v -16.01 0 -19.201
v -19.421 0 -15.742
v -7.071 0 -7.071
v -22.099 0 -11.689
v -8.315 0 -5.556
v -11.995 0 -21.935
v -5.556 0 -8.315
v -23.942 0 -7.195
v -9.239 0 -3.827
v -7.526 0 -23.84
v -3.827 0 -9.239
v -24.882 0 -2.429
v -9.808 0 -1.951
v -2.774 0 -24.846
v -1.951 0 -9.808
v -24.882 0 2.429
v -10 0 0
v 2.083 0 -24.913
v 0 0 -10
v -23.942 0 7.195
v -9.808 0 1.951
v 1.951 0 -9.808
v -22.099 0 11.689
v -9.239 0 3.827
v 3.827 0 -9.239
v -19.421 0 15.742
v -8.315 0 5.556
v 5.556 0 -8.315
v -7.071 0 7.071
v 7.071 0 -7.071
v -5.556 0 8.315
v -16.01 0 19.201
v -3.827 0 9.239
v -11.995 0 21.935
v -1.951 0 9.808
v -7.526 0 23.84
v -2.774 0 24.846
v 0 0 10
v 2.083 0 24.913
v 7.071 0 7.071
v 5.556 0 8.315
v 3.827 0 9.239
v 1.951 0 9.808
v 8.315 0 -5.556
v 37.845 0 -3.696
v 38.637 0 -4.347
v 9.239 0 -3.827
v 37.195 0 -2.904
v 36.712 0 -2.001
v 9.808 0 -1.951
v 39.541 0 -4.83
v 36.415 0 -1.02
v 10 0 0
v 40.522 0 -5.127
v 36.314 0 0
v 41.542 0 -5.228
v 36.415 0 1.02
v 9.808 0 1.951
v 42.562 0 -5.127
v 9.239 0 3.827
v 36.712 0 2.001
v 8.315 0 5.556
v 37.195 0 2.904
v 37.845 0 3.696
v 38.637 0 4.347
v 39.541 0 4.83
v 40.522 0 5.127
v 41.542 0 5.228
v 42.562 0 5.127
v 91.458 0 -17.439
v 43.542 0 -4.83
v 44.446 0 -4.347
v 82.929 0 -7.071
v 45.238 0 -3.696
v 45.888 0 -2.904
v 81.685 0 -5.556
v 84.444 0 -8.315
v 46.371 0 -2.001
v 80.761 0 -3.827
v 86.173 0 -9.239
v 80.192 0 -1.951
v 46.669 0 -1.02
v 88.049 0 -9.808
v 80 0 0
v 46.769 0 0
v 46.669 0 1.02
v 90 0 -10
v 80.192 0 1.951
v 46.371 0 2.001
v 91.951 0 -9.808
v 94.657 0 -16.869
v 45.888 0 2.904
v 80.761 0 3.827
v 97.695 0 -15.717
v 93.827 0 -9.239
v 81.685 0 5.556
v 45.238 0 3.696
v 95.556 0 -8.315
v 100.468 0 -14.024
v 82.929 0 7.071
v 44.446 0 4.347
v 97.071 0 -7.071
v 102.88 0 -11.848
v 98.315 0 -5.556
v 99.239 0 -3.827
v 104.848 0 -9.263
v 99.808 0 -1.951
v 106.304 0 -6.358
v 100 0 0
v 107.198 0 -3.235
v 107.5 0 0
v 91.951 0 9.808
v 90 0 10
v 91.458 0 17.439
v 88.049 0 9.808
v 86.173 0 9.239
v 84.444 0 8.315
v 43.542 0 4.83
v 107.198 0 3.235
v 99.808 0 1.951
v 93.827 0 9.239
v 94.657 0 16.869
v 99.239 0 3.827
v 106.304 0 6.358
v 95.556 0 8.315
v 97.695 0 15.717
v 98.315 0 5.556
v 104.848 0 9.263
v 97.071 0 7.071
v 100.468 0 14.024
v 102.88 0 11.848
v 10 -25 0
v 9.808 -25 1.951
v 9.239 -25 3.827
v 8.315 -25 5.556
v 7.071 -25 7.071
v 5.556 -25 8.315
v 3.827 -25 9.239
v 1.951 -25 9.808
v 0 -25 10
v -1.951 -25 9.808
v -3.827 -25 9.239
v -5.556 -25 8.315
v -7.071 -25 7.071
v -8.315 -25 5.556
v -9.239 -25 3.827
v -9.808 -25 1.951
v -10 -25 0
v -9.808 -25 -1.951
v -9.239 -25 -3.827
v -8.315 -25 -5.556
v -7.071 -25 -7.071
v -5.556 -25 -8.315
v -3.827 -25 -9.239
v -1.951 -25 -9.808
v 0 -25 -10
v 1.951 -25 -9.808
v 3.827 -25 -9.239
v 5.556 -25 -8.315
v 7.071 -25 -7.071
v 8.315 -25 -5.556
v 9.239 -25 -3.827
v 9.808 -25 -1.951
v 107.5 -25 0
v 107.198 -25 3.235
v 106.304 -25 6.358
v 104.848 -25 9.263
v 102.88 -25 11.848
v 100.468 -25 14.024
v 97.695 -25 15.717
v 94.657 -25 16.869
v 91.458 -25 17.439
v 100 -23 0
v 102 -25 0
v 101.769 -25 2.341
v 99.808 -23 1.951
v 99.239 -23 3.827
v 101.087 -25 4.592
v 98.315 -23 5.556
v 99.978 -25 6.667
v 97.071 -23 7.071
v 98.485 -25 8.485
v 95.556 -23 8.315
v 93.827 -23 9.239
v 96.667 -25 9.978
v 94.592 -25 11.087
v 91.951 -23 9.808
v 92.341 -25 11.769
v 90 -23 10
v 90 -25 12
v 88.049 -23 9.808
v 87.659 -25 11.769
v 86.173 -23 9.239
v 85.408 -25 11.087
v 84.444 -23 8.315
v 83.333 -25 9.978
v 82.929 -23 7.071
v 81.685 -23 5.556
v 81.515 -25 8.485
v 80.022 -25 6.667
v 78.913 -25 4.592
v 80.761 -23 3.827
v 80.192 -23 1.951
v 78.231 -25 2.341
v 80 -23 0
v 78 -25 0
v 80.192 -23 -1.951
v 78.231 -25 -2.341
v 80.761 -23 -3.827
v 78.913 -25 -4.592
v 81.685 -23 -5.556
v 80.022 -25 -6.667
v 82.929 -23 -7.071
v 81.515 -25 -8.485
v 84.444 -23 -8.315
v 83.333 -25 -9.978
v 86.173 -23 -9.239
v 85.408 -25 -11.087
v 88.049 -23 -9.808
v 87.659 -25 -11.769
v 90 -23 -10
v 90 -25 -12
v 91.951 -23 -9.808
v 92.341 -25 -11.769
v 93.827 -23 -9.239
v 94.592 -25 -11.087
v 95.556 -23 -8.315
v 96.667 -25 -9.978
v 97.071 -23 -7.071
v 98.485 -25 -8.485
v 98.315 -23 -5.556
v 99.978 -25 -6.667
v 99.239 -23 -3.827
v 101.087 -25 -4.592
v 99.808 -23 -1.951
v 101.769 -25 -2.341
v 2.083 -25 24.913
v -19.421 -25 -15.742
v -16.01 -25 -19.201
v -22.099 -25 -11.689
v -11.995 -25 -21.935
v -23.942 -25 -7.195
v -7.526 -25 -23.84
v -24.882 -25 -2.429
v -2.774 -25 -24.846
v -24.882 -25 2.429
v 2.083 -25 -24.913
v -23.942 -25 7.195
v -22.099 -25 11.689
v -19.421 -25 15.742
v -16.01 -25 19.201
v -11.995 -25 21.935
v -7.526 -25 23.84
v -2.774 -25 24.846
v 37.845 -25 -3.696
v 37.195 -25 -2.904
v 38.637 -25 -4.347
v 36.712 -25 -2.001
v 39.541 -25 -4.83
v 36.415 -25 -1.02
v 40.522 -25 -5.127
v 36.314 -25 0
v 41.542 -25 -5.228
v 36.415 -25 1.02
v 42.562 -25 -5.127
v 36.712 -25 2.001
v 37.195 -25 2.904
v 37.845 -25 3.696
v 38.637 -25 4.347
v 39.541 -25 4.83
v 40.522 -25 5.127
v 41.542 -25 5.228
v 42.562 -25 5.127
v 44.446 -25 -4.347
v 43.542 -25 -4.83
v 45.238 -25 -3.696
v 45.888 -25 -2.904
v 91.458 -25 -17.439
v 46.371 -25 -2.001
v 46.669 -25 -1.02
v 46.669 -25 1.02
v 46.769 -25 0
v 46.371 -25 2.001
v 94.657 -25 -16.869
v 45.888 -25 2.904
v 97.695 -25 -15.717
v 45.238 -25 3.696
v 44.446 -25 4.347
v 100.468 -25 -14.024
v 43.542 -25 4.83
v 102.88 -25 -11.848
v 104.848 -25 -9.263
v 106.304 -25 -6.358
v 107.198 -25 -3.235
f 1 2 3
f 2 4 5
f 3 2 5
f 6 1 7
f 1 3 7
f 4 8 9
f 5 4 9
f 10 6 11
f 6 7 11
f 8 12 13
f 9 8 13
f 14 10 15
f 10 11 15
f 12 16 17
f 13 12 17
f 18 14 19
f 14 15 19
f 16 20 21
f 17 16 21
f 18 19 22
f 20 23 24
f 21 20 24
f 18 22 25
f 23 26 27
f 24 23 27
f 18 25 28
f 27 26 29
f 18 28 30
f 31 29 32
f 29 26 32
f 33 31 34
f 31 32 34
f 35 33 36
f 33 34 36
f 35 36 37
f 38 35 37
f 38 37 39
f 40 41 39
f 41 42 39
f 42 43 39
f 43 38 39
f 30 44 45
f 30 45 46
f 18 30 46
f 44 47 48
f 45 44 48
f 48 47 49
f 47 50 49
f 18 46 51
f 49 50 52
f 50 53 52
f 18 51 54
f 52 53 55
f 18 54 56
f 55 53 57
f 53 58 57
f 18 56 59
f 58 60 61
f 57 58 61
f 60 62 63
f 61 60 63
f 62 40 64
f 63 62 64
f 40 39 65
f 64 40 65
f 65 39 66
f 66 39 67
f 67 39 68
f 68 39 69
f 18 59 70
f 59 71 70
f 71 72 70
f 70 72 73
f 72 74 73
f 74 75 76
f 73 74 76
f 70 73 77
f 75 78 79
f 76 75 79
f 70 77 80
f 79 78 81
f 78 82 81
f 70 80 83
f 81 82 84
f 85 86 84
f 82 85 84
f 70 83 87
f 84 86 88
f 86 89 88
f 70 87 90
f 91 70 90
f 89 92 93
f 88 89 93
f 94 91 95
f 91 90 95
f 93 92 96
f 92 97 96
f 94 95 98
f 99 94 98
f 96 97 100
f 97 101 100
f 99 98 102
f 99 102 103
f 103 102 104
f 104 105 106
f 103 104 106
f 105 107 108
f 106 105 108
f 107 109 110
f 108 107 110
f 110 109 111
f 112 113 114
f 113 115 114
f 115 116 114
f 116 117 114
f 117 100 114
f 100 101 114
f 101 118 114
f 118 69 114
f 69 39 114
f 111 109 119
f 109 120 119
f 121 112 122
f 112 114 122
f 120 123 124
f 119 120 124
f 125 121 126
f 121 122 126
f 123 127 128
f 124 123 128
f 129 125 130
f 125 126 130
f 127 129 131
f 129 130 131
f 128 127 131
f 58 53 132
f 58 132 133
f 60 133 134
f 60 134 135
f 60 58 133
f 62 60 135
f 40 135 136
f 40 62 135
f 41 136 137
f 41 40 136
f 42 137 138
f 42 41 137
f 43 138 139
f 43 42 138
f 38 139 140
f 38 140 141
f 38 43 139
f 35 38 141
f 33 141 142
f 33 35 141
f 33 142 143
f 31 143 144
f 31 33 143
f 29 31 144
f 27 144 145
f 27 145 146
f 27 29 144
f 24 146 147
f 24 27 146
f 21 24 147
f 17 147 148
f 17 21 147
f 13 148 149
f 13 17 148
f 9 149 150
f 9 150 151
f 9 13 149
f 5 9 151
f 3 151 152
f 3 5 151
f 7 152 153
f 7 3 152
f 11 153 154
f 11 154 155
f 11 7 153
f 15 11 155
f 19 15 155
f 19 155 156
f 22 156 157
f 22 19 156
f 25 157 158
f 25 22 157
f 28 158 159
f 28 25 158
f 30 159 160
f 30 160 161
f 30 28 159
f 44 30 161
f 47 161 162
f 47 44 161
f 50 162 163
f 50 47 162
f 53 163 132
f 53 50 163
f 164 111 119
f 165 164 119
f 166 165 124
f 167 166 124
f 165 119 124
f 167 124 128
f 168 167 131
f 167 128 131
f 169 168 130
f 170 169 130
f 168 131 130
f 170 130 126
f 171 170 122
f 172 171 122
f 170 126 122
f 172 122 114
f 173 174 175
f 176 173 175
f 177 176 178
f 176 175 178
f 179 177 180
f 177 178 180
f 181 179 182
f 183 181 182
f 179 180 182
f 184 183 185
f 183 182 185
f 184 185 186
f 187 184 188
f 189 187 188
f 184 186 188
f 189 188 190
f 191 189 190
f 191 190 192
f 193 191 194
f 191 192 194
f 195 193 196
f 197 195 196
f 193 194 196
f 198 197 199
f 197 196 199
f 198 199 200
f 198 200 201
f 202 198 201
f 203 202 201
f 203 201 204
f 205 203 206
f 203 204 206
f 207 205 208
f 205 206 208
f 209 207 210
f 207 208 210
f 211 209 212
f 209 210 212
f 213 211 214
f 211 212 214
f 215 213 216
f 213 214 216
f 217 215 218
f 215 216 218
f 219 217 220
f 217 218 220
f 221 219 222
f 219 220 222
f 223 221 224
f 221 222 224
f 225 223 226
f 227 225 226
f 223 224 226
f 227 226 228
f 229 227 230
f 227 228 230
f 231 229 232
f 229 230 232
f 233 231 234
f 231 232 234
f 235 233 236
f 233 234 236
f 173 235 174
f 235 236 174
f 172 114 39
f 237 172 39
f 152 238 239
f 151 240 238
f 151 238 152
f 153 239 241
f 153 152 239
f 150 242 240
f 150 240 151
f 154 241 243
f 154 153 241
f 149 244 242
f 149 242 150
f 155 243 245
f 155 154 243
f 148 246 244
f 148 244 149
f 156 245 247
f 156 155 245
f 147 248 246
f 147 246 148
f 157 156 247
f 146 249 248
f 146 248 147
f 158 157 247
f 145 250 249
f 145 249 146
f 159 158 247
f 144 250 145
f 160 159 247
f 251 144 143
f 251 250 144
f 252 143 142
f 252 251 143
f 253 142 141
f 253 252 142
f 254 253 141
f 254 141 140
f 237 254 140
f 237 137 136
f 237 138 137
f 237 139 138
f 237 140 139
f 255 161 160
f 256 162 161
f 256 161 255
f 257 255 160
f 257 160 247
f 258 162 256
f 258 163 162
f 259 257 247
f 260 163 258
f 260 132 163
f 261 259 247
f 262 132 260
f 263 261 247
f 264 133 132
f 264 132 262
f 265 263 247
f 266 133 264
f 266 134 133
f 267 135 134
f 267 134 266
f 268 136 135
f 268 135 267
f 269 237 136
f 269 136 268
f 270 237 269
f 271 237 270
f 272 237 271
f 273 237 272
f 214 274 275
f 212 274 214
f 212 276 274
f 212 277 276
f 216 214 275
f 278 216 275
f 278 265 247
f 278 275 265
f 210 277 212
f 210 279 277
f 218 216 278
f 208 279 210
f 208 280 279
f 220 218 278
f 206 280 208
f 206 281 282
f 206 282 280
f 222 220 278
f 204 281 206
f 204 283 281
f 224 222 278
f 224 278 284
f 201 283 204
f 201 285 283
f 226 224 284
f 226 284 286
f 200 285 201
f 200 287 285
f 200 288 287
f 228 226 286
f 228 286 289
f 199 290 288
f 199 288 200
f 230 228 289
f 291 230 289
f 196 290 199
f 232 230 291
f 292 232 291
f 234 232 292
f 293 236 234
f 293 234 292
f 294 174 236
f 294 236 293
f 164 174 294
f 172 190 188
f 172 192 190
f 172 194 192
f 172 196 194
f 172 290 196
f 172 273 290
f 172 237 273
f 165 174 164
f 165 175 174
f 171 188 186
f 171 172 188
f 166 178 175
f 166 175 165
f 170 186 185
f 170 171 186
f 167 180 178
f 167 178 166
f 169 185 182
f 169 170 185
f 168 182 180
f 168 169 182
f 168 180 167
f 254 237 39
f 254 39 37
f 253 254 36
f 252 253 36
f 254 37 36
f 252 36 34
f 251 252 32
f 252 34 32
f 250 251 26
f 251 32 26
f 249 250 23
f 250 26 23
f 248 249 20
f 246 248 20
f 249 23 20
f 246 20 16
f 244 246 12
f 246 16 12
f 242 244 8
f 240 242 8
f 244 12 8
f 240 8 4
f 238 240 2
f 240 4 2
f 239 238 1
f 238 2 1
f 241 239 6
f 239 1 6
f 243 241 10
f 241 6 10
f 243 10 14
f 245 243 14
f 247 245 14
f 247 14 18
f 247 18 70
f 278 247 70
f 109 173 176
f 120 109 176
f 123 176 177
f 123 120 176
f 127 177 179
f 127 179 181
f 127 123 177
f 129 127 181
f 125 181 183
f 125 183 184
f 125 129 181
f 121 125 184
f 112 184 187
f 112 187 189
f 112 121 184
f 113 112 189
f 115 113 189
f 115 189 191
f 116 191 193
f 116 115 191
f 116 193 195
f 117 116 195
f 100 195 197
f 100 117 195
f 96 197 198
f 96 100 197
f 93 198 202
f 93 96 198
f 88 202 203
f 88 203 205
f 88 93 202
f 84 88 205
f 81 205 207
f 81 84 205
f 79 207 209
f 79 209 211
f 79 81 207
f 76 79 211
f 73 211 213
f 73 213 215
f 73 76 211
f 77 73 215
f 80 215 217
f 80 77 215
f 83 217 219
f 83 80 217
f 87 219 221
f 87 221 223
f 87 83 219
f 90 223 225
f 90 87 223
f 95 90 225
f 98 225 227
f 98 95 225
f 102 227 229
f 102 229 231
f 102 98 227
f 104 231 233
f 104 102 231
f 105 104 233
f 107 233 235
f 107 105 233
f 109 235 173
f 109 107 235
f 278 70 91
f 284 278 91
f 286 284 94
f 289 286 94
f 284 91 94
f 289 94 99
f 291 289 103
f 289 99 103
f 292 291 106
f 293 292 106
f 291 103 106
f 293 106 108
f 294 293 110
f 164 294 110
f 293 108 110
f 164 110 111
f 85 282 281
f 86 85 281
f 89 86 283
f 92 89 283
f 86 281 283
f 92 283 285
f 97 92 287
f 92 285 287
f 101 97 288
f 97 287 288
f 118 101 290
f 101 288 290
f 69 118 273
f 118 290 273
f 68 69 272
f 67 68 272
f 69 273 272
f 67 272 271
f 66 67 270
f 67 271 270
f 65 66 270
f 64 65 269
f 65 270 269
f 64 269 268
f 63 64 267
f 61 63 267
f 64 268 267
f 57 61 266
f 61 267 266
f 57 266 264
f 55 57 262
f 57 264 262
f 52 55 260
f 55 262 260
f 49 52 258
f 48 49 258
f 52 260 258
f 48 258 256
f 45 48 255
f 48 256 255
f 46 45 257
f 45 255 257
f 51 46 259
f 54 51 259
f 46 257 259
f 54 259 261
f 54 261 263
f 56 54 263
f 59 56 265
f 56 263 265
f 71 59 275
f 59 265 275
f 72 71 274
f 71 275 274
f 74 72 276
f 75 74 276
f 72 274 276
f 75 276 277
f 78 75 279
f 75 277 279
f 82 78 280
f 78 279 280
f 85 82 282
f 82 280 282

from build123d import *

# Parameters (mm, degrees)
F0_R     = 10
F1_DEPTH = 25
F2_SIZE  = 2
F6_R     = 5.2276340185
F7_DEPTH = 25


# Not quite as in the source:
# - the program builds the solid bodies; features that only make, move or delete a surface that nothing else refers to are left out


with BuildPart() as f1:
    # F0 (on Front) → F1 (new body)
    with BuildSketch(Plane.XZ):
        with BuildLine():
            ThreePointArc((2.0833333333, -24.9130432148), (18.3995018048, -16.9250800097), (25, 0))
            ThreePointArc((25, 0), (18.3995018048, 16.9250800097), (2.0833333333, 24.9130432148))
            ThreePointArc((2.0833333333, 24.9130432148), (-25, 0), (2.0833333333, -24.9130432148))
        make_face()
        Circle(F0_R, mode=Mode.SUBTRACT)
        with BuildLine():
            ThreePointArc((2.0833333333, 24.9130432148), (18.3995018048, 16.9250800097), (25, 0))
            ThreePointArc((25, 0), (18.3995018048, -16.9250800097), (2.0833333333, -24.9130432148))
            Line((2.0833333333, -24.9130432148), (91.4583333333, -17.4391302504))
            ThreePointArc((91.4583333333, -17.4391302504), (72.5, 0), (91.4583333333, 17.4391302504))
            Line((91.4583333333, 17.4391302504), (2.0833333333, 24.9130432148))
        make_face()
        with BuildLine():
            ThreePointArc((107.5, 0), (102.8796512634, 11.8475560068), (91.4583333333, 17.4391302504))
            ThreePointArc((91.4583333333, 17.4391302504), (72.5, 0), (91.4583333333, -17.4391302504))
            ThreePointArc((91.4583333333, -17.4391302504), (102.8796512634, -11.8475560068), (107.5, 0))
        make_face()
        with Locations((90, 0)):
            Circle(F0_R, mode=Mode.SUBTRACT)
    extrude(amount=F1_DEPTH)

    # F2
    f2_edges = [f1.edges().sort_by_distance(p)[0] for p in [
        (80, -25, 0),
    ]]
    chamfer(f2_edges, length=F2_SIZE)

    # F6 (on face) → F7 (cut)
    with BuildSketch(Plane.XZ.offset(25)):
        with Locations((41.5417253971, 0)):
            Circle(F6_R)
    extrude(amount=-F7_DEPTH, mode=Mode.SUBTRACT)


solid = f1.part
